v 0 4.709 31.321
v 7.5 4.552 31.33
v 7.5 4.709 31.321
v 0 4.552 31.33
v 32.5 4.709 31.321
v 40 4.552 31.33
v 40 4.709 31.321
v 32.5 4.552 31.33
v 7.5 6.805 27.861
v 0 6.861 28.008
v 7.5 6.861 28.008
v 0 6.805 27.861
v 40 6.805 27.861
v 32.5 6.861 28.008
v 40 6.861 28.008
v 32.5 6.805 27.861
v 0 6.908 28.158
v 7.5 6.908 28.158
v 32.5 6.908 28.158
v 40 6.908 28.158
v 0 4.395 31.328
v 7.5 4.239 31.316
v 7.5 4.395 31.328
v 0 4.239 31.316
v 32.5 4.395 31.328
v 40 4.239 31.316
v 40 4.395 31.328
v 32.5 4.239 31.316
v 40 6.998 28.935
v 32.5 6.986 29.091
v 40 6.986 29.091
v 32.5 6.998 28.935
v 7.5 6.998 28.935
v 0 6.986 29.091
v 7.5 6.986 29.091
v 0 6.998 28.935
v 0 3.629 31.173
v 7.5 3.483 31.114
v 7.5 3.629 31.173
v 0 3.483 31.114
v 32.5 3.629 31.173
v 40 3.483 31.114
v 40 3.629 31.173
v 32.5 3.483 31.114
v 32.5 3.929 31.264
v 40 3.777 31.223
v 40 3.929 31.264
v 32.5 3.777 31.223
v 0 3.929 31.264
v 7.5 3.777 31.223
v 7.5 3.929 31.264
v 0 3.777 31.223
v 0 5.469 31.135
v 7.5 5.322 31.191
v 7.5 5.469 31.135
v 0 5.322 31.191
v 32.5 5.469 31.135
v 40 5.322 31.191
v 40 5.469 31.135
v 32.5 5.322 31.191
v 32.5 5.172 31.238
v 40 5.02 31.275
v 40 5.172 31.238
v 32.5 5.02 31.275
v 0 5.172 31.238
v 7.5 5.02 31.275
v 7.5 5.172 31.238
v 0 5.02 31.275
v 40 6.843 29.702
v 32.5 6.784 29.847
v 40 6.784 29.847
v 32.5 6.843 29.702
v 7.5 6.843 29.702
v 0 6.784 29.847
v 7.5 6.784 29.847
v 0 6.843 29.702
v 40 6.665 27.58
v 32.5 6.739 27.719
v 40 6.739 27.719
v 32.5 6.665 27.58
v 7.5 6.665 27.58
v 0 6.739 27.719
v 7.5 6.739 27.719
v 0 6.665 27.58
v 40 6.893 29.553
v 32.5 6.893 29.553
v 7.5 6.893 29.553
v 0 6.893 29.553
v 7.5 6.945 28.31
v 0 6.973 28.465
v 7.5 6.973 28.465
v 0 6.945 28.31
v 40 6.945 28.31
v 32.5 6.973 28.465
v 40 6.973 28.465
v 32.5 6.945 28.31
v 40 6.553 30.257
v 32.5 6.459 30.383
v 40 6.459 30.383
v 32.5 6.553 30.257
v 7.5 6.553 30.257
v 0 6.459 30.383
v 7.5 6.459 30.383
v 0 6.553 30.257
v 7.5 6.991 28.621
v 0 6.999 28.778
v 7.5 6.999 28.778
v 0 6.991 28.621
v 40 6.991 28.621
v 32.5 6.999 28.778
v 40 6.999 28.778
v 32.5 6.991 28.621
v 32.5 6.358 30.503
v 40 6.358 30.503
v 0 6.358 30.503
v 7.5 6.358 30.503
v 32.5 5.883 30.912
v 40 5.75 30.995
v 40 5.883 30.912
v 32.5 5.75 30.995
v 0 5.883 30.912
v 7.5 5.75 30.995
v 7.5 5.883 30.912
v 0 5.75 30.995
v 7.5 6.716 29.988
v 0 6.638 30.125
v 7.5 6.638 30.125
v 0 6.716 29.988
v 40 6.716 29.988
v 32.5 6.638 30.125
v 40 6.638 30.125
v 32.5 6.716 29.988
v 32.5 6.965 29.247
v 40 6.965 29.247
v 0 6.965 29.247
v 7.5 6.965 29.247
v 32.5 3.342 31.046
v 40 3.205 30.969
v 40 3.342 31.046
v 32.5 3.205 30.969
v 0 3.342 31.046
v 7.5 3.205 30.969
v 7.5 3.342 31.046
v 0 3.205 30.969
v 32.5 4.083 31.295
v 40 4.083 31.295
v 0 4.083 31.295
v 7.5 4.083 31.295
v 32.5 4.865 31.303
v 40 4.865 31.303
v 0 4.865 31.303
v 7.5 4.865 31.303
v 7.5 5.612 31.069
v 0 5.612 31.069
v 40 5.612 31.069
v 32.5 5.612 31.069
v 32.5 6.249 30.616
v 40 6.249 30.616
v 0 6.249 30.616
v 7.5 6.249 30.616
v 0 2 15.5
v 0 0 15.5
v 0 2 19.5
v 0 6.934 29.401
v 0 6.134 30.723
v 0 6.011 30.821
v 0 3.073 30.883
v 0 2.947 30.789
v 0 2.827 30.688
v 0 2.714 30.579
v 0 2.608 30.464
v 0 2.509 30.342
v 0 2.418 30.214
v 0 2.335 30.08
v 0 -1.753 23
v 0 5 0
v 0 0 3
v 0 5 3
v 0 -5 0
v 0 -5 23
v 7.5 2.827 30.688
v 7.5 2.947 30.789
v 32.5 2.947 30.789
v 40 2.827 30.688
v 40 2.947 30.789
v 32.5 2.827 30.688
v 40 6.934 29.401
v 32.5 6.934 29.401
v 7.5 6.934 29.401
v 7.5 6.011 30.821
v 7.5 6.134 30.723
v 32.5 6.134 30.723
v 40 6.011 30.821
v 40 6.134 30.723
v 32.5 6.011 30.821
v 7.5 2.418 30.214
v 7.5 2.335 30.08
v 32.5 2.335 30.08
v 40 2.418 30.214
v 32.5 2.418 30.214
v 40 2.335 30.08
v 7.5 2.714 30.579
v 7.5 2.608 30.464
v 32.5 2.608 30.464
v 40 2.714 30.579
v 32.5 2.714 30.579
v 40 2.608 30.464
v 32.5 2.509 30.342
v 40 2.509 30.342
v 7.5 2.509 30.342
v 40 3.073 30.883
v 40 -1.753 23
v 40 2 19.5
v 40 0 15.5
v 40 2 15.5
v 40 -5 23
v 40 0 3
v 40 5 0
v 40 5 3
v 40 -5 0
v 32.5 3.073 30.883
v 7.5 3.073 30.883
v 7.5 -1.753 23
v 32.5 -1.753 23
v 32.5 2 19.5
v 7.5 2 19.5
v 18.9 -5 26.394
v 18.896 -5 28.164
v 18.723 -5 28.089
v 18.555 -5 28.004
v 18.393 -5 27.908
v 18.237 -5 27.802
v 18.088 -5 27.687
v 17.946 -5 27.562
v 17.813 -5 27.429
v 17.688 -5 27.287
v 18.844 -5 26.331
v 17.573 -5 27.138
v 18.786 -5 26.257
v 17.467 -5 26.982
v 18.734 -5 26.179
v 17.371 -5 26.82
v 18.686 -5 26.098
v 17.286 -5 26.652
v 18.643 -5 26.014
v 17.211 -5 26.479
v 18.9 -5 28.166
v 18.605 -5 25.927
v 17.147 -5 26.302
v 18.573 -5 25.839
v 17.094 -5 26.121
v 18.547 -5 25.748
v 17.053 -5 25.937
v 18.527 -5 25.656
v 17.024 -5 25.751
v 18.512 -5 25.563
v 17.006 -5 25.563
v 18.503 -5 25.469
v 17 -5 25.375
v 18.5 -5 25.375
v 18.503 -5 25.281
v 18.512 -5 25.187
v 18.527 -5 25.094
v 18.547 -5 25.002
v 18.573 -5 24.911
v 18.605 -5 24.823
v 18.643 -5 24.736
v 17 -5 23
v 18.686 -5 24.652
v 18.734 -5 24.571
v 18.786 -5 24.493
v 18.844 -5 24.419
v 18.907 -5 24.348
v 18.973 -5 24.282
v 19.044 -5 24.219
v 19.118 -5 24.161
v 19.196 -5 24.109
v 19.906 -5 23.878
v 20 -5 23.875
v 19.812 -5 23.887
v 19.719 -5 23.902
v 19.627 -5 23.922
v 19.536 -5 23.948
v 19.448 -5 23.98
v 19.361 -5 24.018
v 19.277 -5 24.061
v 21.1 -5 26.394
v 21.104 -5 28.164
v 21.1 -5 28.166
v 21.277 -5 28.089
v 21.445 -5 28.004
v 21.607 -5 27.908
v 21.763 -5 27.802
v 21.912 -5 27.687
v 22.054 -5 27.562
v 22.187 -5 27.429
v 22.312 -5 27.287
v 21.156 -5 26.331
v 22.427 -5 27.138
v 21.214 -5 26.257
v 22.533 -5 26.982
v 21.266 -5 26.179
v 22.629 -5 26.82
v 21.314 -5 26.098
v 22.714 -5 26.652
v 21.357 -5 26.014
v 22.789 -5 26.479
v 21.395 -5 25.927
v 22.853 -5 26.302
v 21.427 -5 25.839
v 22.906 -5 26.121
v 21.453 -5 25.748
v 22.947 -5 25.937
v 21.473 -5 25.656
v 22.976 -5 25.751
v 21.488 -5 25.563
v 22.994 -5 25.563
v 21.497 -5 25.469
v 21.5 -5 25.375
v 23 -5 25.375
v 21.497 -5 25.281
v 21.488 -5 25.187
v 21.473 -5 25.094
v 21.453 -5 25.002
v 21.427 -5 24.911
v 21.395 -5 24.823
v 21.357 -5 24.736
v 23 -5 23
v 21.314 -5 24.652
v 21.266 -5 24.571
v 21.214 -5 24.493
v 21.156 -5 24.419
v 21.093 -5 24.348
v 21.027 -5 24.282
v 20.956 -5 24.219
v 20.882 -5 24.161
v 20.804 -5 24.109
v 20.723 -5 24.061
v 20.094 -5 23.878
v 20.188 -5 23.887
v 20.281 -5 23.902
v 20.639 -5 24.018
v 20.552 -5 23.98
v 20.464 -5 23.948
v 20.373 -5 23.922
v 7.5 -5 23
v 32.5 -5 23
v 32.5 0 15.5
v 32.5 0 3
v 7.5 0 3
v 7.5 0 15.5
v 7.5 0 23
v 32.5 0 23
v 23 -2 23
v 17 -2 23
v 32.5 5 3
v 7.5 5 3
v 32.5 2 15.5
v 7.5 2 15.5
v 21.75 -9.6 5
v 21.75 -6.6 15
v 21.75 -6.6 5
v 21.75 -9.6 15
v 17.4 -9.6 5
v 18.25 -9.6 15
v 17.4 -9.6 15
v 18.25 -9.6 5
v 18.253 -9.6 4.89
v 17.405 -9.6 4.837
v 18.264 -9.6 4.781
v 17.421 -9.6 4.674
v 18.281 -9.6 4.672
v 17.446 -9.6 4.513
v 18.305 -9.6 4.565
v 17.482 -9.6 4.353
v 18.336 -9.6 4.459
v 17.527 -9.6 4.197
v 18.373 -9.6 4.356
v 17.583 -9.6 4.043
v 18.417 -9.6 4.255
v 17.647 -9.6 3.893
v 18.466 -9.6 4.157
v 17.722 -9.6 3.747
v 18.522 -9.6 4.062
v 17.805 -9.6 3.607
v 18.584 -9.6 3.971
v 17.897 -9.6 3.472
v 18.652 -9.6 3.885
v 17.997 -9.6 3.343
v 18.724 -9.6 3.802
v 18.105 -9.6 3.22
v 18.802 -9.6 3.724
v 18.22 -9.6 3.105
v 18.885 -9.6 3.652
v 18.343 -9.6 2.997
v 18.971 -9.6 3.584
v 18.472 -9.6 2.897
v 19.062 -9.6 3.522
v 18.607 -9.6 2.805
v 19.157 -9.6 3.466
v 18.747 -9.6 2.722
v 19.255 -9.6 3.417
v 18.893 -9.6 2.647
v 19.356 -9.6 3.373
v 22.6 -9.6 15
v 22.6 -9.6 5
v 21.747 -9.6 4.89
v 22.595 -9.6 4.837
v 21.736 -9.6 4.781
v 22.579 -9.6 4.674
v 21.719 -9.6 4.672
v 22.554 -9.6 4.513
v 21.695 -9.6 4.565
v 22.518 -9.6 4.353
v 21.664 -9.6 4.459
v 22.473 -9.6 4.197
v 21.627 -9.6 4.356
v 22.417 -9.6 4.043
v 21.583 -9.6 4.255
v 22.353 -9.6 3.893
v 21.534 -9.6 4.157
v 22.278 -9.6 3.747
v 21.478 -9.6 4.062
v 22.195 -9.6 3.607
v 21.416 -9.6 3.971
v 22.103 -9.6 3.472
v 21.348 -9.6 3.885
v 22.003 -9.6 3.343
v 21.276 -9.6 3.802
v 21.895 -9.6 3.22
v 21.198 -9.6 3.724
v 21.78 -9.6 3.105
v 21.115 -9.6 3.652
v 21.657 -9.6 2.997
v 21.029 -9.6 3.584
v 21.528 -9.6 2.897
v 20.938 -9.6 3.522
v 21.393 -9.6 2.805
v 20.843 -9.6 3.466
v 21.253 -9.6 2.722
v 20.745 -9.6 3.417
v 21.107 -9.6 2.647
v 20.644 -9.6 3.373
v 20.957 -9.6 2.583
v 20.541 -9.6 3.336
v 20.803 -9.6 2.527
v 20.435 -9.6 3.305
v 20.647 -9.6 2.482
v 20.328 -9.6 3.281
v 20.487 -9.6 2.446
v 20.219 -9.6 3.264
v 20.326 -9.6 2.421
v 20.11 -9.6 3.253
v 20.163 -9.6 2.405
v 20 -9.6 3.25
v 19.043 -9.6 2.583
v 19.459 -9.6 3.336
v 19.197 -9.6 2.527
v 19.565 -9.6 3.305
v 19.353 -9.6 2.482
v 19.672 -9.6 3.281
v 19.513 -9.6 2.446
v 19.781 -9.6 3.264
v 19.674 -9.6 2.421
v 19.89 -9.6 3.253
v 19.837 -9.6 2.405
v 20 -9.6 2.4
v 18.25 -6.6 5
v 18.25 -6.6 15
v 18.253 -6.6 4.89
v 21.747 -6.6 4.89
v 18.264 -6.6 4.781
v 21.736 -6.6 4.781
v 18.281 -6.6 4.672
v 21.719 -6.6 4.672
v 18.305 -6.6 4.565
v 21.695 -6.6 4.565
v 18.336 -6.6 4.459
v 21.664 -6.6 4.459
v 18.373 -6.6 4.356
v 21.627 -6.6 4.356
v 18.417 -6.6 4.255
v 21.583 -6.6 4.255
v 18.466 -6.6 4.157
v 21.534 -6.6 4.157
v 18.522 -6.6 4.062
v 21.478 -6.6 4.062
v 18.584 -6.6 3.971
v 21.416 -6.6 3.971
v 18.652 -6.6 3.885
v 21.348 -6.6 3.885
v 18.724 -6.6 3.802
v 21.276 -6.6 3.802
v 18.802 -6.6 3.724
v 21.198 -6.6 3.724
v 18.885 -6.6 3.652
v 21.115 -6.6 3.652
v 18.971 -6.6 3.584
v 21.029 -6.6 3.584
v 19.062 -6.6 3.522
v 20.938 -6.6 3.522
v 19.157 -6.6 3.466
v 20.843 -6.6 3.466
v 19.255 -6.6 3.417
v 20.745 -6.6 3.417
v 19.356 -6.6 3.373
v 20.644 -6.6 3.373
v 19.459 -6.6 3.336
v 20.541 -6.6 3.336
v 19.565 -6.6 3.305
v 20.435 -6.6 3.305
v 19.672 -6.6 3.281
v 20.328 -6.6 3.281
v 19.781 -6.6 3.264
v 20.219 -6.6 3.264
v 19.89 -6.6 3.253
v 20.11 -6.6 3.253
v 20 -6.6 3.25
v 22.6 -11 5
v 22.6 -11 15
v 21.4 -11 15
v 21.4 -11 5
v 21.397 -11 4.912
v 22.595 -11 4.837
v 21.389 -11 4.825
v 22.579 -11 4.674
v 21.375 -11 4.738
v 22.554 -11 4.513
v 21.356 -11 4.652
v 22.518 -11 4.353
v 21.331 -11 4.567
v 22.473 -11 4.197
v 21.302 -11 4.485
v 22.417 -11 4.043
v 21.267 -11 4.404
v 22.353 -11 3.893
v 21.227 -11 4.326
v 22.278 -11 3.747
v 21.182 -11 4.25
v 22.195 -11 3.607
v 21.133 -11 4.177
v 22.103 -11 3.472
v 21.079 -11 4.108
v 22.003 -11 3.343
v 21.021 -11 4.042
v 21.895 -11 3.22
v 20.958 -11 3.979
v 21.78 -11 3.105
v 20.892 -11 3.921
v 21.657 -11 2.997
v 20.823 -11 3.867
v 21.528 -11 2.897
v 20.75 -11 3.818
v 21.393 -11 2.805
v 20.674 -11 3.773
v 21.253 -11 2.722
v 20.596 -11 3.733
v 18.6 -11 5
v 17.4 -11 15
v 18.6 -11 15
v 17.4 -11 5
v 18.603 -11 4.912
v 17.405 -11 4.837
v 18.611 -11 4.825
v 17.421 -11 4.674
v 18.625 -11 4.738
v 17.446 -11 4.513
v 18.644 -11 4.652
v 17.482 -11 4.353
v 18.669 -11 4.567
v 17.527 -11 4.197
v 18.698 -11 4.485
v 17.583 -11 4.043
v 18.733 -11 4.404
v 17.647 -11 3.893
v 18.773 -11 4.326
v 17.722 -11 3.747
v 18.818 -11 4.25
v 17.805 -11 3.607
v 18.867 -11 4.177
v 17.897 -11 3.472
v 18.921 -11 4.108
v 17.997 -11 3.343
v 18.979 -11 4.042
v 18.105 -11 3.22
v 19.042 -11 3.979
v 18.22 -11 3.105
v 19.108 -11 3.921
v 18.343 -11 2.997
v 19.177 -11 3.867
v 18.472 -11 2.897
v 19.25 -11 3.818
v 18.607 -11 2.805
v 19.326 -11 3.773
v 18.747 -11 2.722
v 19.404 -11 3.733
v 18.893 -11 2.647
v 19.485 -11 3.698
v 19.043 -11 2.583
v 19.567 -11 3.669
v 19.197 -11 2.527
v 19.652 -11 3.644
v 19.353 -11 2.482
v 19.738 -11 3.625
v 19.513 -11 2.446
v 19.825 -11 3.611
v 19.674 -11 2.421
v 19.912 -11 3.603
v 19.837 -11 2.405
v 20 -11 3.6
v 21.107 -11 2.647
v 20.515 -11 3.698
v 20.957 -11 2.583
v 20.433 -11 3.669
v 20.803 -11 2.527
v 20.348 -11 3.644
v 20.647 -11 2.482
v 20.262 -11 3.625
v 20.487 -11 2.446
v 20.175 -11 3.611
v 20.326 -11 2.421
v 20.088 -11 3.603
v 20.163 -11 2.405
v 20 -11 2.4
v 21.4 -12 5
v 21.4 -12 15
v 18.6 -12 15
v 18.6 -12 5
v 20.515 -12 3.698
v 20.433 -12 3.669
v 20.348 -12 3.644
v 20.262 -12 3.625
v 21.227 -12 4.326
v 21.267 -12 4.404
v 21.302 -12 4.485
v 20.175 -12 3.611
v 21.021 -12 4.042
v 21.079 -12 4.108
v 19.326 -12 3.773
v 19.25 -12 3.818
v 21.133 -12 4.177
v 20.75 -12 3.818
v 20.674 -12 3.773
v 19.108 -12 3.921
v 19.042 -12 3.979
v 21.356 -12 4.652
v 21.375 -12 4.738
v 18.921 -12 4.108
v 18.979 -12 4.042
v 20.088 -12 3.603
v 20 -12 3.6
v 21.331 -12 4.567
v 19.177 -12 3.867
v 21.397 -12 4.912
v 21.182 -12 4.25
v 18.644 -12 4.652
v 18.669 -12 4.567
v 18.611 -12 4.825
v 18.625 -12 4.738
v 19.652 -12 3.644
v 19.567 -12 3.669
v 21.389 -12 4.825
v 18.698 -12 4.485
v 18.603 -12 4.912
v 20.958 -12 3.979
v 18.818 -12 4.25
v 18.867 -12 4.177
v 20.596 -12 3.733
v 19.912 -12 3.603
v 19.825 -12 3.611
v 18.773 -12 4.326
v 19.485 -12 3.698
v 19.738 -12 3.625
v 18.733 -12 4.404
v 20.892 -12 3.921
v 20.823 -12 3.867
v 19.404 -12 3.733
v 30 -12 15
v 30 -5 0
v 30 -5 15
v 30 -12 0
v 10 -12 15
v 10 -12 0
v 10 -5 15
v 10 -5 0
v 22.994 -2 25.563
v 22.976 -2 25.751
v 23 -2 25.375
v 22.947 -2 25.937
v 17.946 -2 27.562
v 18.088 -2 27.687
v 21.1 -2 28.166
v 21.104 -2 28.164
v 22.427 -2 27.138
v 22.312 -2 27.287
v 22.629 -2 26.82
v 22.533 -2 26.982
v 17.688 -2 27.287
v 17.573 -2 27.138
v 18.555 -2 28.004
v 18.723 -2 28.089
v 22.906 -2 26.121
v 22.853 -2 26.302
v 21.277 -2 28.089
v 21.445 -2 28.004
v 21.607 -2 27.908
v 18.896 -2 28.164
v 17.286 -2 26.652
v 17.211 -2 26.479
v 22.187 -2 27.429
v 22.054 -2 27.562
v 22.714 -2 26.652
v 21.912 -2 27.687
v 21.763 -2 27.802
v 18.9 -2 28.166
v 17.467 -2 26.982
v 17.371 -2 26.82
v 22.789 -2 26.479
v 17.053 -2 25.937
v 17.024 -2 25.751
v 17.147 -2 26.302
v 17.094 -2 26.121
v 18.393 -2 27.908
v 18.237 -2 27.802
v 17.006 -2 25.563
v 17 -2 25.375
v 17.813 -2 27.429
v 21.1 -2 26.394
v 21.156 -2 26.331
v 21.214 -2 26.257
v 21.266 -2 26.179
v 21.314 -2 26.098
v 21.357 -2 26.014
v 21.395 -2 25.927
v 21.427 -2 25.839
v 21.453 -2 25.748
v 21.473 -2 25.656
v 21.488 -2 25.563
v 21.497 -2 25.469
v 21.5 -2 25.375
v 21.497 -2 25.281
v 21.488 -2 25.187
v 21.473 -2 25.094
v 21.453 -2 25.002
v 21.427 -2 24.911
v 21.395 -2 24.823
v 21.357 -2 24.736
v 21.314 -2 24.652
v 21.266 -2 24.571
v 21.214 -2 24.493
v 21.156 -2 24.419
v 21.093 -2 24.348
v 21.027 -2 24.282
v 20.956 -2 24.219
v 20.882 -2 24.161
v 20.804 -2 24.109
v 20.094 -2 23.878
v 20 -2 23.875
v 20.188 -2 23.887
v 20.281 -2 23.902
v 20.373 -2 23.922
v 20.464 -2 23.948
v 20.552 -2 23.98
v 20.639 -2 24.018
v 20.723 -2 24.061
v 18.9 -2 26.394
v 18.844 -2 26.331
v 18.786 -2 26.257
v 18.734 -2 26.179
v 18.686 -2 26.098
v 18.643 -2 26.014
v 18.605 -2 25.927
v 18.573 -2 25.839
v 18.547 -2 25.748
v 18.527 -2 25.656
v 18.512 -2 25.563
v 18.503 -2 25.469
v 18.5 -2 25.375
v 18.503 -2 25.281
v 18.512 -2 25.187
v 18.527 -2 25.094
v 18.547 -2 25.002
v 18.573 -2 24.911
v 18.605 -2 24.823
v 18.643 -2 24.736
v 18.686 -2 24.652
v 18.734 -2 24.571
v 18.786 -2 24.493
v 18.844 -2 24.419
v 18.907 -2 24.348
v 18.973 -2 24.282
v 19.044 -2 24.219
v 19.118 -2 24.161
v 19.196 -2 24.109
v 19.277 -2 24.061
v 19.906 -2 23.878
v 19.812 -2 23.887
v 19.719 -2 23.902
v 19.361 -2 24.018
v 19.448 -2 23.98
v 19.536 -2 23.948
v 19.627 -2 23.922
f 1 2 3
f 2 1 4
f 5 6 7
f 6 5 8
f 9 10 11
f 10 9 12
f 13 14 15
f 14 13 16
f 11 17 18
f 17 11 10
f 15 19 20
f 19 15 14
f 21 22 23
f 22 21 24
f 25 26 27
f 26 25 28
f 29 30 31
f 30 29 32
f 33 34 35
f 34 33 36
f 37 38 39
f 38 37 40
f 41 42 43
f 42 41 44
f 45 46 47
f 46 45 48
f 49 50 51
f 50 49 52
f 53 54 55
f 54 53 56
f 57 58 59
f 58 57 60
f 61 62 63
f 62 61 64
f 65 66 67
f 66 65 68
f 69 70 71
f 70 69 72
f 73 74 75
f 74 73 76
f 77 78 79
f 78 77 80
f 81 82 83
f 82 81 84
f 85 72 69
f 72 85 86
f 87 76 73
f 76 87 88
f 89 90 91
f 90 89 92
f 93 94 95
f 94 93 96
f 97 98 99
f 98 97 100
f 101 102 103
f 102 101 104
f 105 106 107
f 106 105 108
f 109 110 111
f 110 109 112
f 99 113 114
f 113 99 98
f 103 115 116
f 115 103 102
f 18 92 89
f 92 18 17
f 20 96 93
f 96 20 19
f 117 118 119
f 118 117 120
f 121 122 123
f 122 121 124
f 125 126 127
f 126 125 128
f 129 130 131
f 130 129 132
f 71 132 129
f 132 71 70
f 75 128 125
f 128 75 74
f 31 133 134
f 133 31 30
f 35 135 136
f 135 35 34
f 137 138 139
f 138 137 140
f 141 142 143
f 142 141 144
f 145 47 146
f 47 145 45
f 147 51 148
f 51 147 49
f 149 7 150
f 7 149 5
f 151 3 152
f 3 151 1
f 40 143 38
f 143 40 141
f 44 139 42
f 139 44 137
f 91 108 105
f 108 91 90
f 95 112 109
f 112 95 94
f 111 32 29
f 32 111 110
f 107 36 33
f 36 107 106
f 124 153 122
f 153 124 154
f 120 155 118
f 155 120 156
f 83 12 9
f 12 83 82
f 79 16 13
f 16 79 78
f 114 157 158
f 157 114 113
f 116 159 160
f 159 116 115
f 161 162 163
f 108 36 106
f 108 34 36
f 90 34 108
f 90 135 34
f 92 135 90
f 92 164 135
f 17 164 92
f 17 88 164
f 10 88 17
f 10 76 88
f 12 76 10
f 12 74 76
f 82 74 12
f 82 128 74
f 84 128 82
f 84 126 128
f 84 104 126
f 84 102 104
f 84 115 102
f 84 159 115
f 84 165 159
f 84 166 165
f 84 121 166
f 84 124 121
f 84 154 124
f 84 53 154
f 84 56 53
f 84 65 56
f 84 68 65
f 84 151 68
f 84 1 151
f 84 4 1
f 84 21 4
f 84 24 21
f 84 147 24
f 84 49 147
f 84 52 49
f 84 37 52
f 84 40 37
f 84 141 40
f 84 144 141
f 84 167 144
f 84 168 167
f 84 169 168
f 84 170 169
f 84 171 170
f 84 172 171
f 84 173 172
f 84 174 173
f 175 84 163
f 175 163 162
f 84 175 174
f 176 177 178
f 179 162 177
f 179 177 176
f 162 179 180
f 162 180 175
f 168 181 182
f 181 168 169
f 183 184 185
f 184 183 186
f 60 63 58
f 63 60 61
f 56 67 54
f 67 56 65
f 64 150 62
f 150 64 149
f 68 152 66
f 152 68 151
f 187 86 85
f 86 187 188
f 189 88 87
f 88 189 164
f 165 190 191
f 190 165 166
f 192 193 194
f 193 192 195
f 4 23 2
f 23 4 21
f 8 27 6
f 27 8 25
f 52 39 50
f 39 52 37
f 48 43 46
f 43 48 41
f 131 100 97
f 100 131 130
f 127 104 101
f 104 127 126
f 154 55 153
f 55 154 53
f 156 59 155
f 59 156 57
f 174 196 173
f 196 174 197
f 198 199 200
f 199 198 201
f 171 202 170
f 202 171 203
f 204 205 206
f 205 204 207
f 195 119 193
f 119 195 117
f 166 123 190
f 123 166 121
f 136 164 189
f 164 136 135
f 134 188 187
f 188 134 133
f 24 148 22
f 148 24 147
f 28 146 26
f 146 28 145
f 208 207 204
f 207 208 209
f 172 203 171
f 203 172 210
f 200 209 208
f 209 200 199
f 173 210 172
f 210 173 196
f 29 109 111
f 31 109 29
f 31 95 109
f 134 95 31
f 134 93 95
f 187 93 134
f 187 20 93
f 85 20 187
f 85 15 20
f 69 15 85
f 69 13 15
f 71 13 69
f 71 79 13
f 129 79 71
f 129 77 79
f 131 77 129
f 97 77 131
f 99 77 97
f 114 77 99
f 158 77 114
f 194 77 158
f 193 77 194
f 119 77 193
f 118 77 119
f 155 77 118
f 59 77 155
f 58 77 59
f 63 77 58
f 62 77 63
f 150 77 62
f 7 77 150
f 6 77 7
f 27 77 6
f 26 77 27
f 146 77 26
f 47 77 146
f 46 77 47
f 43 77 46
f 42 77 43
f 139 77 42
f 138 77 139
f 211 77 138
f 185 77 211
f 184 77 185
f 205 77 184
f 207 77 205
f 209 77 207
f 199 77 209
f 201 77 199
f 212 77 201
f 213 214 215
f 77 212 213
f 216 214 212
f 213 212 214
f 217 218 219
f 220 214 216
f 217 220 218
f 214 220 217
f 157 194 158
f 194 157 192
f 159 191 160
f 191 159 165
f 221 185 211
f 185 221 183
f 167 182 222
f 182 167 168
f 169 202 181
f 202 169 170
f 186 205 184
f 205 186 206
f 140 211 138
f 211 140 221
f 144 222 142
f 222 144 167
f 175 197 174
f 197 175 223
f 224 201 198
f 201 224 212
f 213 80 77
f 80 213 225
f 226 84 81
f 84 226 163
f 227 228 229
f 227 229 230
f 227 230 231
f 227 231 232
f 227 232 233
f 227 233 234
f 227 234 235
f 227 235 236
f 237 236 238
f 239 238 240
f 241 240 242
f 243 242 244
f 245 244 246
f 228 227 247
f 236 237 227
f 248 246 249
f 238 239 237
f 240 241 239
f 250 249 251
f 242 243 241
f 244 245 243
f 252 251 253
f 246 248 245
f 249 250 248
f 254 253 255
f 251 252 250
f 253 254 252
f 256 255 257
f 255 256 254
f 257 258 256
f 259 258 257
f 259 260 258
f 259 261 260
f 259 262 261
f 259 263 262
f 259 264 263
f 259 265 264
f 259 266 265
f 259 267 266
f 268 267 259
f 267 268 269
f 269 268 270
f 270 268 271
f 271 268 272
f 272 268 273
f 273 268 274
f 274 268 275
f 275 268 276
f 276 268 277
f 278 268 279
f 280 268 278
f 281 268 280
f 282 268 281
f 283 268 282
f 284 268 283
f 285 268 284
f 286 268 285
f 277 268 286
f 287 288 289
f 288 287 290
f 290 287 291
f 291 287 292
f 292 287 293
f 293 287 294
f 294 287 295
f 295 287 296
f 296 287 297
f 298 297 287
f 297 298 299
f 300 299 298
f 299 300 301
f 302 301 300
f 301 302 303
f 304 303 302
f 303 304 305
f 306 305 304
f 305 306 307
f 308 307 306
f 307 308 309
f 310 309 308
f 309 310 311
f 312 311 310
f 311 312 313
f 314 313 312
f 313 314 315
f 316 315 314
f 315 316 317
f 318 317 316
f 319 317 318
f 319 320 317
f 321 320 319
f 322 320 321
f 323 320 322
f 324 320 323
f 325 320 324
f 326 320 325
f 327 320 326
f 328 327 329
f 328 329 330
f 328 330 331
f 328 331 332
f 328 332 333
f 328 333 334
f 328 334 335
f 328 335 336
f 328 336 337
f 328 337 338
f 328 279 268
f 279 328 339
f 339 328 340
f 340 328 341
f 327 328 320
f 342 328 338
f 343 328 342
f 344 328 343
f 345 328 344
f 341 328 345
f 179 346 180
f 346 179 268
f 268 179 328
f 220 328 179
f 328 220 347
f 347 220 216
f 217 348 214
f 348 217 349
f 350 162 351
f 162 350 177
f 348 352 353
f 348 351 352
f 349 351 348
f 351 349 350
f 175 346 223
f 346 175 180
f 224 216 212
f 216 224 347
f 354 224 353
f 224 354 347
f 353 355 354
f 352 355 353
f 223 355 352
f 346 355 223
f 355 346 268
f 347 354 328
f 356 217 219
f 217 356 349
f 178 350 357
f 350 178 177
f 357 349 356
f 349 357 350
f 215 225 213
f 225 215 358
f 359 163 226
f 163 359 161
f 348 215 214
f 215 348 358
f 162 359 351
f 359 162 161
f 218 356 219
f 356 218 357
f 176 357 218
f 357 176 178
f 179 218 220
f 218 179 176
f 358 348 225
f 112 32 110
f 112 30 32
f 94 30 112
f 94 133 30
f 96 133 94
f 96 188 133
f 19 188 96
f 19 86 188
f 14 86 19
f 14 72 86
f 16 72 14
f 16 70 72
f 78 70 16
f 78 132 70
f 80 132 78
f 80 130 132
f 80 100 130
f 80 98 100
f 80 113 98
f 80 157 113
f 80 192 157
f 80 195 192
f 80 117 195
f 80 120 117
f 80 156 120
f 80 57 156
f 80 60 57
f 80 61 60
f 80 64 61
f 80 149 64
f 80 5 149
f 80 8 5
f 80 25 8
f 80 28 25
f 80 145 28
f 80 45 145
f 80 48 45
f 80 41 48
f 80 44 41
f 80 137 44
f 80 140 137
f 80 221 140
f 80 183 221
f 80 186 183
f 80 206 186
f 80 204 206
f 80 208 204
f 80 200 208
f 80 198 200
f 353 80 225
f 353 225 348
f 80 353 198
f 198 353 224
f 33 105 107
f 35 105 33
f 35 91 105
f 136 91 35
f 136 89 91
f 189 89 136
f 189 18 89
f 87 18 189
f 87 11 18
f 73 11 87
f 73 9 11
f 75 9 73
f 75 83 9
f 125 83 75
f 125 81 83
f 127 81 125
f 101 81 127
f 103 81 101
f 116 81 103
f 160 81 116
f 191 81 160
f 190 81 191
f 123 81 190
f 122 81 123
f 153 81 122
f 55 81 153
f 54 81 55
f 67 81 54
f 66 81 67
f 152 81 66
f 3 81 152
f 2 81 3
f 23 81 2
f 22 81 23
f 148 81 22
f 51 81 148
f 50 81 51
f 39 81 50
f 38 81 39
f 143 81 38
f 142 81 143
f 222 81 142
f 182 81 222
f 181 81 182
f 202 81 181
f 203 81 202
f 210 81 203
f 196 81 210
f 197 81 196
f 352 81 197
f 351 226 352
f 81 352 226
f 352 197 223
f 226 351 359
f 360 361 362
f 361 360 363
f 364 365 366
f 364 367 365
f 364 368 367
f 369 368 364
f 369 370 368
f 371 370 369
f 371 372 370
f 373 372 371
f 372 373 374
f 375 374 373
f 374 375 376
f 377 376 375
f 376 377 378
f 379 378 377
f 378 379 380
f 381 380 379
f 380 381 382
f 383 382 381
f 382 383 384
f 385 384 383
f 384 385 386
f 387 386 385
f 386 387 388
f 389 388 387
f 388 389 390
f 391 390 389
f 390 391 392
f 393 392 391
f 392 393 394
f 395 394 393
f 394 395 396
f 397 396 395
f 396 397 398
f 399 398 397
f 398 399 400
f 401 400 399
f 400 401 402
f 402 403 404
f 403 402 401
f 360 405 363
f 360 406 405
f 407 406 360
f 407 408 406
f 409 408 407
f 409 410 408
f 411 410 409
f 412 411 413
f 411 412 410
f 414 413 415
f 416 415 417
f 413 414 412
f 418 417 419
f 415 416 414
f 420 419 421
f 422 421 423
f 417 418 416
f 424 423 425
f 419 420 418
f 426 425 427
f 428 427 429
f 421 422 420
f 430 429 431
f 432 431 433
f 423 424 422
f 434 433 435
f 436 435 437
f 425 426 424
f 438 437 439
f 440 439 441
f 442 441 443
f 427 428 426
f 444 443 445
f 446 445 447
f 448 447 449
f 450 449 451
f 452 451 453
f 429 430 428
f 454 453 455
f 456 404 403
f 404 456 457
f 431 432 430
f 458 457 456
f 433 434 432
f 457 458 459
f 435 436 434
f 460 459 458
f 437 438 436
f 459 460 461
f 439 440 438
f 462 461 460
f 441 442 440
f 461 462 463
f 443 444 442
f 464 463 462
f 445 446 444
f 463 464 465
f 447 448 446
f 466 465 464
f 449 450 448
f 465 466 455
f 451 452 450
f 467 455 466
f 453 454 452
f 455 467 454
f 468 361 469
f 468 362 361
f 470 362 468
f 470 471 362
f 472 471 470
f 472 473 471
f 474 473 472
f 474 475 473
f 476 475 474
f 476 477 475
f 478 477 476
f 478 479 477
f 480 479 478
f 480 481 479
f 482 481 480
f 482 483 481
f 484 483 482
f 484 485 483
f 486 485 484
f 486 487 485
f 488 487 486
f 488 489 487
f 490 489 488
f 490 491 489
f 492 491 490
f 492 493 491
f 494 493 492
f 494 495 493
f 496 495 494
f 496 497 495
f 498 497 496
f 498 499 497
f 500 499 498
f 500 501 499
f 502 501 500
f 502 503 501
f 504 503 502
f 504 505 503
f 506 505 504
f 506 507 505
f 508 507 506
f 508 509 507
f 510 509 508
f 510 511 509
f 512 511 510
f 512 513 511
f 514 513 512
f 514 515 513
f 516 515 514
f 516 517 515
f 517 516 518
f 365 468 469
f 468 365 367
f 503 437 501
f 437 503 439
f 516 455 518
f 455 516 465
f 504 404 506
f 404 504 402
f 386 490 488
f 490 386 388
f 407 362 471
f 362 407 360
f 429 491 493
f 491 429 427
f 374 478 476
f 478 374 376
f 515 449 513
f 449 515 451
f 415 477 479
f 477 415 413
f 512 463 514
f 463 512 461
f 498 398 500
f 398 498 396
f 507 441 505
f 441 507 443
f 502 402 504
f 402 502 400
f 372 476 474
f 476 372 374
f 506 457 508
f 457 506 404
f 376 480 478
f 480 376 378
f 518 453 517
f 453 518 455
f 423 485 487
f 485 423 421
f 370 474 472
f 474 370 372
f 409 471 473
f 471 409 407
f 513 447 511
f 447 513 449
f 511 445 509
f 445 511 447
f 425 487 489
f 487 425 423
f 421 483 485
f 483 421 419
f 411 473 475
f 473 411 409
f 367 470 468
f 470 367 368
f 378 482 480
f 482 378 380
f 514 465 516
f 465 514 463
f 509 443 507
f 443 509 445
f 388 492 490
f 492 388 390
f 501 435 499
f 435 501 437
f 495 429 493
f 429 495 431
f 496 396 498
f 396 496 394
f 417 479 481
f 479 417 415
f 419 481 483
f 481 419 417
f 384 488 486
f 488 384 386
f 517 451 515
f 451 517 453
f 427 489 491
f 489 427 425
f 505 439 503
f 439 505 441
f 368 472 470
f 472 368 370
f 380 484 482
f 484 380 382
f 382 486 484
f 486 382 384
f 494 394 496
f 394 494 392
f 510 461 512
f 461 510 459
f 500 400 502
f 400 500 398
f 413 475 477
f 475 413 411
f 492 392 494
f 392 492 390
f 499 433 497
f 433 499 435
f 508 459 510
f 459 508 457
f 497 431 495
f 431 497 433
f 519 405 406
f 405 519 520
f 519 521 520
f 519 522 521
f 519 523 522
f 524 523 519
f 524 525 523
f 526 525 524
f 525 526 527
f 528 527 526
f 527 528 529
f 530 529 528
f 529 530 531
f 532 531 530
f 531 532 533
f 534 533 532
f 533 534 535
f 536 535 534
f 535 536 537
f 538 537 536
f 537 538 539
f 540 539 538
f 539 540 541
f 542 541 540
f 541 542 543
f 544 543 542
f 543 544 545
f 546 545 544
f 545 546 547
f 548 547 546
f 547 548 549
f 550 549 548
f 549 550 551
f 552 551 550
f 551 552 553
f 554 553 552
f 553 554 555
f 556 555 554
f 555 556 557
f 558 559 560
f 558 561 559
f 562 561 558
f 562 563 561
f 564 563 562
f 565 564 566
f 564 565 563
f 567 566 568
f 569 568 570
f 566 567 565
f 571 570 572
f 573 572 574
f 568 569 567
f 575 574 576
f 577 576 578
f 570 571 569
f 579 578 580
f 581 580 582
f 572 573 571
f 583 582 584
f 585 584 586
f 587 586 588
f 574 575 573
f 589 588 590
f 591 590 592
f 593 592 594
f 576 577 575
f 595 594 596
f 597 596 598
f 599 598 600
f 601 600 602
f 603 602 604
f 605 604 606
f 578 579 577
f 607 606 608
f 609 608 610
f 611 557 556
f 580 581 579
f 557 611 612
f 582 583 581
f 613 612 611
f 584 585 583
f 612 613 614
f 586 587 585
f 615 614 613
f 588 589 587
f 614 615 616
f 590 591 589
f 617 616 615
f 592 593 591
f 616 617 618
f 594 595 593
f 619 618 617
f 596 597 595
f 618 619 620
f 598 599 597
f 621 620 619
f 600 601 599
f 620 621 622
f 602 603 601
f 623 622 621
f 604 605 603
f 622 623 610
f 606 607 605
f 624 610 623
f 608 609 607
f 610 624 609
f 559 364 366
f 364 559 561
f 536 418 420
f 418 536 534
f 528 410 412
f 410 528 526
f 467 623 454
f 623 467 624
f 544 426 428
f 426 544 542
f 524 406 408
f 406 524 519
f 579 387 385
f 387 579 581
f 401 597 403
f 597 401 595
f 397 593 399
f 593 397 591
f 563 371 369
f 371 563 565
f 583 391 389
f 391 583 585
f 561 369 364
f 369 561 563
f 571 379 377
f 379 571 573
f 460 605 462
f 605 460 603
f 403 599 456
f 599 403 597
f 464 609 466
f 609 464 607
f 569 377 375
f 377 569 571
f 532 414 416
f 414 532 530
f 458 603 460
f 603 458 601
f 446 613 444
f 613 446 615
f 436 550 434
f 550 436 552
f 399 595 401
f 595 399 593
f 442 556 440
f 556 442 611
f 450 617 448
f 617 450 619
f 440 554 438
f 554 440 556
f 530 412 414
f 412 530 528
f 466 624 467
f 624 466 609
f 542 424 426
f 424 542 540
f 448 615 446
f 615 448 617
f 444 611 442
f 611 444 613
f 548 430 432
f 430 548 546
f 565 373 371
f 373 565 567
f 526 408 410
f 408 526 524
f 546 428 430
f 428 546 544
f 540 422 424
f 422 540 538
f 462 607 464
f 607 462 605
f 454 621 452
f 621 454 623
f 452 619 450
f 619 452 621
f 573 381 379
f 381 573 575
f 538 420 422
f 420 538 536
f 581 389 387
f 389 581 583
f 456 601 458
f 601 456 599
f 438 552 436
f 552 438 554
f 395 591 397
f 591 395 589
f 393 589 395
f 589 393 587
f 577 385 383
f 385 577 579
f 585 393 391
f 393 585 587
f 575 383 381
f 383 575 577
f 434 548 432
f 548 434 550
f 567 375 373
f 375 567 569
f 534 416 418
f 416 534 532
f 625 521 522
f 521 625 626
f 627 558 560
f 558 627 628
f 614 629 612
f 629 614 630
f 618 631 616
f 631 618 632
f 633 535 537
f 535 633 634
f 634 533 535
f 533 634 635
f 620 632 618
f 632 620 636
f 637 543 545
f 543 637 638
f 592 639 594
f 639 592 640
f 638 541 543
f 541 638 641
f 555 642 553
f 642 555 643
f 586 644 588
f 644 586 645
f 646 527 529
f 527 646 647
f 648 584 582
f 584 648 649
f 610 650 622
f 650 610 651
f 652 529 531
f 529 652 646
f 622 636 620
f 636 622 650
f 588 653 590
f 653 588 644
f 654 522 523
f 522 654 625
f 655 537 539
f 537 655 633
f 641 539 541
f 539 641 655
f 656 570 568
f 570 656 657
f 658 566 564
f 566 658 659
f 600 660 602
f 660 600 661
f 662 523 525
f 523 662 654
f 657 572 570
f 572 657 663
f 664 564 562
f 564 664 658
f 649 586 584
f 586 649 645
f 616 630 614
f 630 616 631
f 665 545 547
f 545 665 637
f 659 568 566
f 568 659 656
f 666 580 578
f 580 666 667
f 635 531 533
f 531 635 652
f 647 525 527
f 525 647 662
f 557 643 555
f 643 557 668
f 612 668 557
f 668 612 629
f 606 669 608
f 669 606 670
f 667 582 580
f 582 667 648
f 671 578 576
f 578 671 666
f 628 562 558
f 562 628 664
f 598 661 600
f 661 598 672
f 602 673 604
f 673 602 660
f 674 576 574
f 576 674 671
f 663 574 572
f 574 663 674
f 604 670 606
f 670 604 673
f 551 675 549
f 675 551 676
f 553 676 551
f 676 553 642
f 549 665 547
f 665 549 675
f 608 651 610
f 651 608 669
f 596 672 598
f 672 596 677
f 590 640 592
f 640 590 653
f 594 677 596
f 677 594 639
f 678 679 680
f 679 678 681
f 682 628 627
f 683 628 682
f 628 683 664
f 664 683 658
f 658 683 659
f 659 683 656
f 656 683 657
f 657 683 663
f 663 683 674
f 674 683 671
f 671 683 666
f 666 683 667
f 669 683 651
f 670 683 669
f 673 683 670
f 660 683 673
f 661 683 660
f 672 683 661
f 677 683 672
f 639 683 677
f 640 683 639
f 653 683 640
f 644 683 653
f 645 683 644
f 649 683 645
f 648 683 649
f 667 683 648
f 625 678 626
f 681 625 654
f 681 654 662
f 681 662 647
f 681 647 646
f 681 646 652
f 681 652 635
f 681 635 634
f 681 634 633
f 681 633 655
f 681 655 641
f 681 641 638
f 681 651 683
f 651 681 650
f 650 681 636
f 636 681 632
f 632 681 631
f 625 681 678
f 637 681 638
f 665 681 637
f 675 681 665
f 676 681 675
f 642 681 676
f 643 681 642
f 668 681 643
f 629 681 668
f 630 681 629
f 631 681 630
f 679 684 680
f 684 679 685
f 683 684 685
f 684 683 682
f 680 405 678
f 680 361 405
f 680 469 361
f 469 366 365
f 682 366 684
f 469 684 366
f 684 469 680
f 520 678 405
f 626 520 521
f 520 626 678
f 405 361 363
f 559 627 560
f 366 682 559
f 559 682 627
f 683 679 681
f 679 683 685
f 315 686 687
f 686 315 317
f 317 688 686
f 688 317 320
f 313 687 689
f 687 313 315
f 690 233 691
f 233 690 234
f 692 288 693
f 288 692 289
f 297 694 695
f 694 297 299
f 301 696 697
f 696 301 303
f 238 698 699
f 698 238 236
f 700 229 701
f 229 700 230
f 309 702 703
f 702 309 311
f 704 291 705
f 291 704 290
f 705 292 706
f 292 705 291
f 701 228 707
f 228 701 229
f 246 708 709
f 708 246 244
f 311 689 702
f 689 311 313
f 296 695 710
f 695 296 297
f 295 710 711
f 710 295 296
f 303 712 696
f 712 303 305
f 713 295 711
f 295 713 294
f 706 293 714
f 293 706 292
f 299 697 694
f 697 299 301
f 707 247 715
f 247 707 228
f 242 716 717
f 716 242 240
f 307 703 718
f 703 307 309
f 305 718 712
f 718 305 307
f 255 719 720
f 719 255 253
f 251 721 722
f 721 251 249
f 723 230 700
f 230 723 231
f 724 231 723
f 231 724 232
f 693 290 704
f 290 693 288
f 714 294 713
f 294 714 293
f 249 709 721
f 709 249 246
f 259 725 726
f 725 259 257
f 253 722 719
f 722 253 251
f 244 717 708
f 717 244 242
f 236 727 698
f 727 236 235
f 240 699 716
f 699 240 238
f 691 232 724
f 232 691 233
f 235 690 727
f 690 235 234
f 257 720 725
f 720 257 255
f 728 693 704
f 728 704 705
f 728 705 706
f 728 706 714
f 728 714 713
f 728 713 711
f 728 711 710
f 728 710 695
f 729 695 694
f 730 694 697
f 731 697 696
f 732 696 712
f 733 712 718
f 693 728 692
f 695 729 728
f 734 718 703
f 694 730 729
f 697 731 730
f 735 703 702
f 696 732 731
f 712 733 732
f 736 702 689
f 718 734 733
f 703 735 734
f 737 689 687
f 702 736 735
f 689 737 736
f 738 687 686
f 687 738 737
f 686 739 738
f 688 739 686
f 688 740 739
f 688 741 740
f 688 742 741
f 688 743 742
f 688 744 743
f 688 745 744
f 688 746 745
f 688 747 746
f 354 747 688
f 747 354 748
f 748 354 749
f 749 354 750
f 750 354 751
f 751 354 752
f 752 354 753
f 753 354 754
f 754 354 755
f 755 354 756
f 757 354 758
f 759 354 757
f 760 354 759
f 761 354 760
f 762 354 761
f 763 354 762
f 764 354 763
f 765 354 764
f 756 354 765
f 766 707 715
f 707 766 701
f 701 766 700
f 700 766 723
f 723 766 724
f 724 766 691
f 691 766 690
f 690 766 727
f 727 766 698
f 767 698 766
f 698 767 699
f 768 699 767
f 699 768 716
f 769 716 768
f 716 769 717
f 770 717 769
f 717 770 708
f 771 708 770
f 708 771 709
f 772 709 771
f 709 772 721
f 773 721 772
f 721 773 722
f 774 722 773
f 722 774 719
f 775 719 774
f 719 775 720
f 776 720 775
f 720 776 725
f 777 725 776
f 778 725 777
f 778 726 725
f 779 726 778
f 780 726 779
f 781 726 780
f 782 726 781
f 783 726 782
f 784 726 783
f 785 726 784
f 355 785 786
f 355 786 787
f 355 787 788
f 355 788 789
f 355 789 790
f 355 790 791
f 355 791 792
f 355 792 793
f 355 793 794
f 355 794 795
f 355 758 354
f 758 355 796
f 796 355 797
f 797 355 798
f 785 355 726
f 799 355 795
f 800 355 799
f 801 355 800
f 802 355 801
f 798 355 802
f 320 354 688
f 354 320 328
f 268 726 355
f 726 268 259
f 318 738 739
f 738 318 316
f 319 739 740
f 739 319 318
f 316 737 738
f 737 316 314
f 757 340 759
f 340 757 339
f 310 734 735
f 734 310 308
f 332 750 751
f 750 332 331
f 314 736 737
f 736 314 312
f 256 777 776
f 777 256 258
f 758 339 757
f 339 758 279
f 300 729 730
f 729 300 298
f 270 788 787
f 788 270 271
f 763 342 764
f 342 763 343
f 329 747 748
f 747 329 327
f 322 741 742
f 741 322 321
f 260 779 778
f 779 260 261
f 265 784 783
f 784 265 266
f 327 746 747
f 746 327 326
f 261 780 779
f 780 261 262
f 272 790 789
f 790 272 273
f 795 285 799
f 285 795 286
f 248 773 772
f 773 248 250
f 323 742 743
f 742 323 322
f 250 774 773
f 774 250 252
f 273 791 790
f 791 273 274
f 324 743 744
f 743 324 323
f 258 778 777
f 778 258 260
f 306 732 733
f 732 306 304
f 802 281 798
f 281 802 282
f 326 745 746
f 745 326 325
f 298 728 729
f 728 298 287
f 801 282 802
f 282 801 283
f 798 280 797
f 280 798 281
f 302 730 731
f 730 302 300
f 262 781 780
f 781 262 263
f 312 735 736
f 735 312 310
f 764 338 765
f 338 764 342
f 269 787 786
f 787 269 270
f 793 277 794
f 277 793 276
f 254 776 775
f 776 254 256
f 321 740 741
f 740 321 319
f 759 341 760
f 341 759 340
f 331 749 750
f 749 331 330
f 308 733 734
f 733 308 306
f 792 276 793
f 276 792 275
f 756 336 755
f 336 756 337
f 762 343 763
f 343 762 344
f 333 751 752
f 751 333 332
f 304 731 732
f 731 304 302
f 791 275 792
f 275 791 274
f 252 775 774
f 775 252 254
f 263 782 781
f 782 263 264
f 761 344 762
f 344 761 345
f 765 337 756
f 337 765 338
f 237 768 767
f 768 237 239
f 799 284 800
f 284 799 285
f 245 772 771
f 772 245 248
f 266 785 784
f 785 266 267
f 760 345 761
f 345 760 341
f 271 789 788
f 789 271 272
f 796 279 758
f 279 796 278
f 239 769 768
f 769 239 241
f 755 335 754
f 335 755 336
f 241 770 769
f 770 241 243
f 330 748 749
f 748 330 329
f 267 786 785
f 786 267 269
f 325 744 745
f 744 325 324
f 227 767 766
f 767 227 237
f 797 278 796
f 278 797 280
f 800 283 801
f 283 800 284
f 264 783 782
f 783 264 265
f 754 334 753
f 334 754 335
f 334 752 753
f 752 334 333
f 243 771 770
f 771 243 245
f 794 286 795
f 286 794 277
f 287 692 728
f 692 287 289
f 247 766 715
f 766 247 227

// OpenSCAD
length = 11;
gap1   = 1;   // 1
gap2   = 1.4; // 1.2
gap3   = 3;   // 3
gap_all = gap1 + gap2 + gap3;
width1 = 2.8;   // 2.7   -> 2.8
width2 = 5.2;  // 4.75  -> 4.4; 5 -> still less
width3 = 3.5;  // 3.25  -> 3.03
holder_height = 7;

// layer of slot of fixed width and round end on one side
module layer(width, height, length, shift=0) {
    union() {
        translate([-width/2,0,shift])
            cube([width,length,height]);
        translate([0,0,shift])
            cylinder(height, width/2, width/2, $fn=100);
    }
}

// slot shape to insert remaining TrackIR pin
module grove() {
    union() {                                       //     real   expect   diff   ratio
        layer(width3, gap3, length, 0);             // w = 3.03   3.25     -0.22
        layer(width2, gap2, length, gap3);          // w = 4.4    4.75     -0.35
        layer(width1, gap1+0.1, length, gap3+gap2); // w = 2.8    2.7      +0.1
    }
}

// square piece where TrackIR stays
module holder() {
    offset = holder_height-gap_all;
    translate([0, 5, offset]) difference() {
        translate([-10, -5, -offset]) cube([20, 15, holder_height]);
        grove();
    }
}


base_wall = 3;
base_width_ir = 40;
base_width_cam = 30;
base_width = base_width_ir; // + base_width_cam;
base_gap = 44.5;
base_height = 5;
base_hook_height = 5; // was 7

// part of holder that sits on monitor
module basement2() {
    union() {
        cube([base_width, base_gap+1.4, base_height]);
        translate([0, -base_wall, -base_hook_height]) cube([base_width, base_wall, base_height + base_hook_height]);
        translate([0, base_gap]) rotate([20, 0, 0]) translate([0, 0, -base_hook_height-0.9]) cube([base_width, base_wall, base_height + base_hook_height]);
    }
}

wire_dia = 3;
wire_thick = 1.5;
wire_thick2 = 3;
wire_gap_width = 2.2;

module wire_hole() {
    difference() {
        union() {
            cylinder(h=wire_thick2, r=wire_dia/2+wire_thick, center=true, $fn=100);
            translate([0,-(wire_dia/2+wire_thick)/2,0]) cube([wire_dia+wire_thick*2, wire_dia/2+wire_thick, wire_thick2], center=true);
        }
        cylinder(h=wire_thick2+1, r=wire_dia/2, center=true, $fn=100);
        translate([0,wire_dia+wire_thick,0]) cube([wire_gap_width, (wire_dia+wire_thick) * 2, wire_thick2+1], center=true);
    }
}

module tail(thick, width, len, angle, base_thick) {
    vert_len = thick/cos(angle);
    center_shift = -(base_thick-vert_len)/2 * tan(90-angle);
    translate([0, center_shift, base_thick/2]) rotate([-angle, 0, 0]) difference() {
        // translate([width/2, 0, 0]) 
        union() {
            // round end
            color([1,0.2,0.2]) translate([0, len, 0]) rotate([0, 90, 0]) cylinder(h=width, r=thick/2, center=true, $fn = 100);
            // main plane
            color([1,0.3,0.3]) translate([0, len/2 - thick/4, 0]) cube([width, len + thick/2, thick], center=true);
            // joining bit
            color([1,0.4,0.4]) rotate([angle, 0, 0]) cube([width, base_thick, base_thick], center=true);
        }
        // base plane trim above
        color ([0, 1, 0]) translate([0, 0, thick]) cube([width+2, len * 2, thick], center=true);
        // join trim
        color ([0, 0, 1]) rotate([angle, 0, 0]) translate([0, 0, base_thick]) cube([width+2, base_thick, base_thick], center=true);
        color ([0, 0, 1]) rotate([angle + 90, 0, 0]) translate([0, 0, base_thick]) cube([width+2, base_thick, base_thick], center=true);

    }
}

base_depth = 20;
back_radius = 100;
back_thickness = 5;
base_gap_width = 25;

module basement() {
    difference() {
        union() {
            // flat part
            cube([base_width, base_depth, base_height]);
            translate([0,12.5,-2]) cube([base_width, 4, base_height + 2]);
            // front side
            translate([0, -base_wall, -base_hook_height]) cube([base_width, base_wall, base_height + base_hook_height]);
            // back curve (shift -21, +10) -> (-18, 3)
            // difference() {
            //     translate([base_width/2, -back_radius/2-9.5, -back_radius/2-9]) rotate([0,90,0]) difference() {
            //         cylinder(h=base_width, r=back_radius, center=true, $fn=500);
            //         cylinder(h=base_width+2, r=back_radius - back_thickness, center=true, $fn=500);
            //     }
            //     translate([-1, -back_radius*3, 2]) cube([base_width+2, back_radius*6, 100]);
            //     translate([-1, -back_radius*3, -back_radius*3-7]) cube([base_width+2, back_radius*6, back_radius*3]);
            //     translate([-1, -back_radius*2, -back_radius]) cube([base_width+2, back_radius*2, back_radius*2]);
            // }
            
            translate([base_width/2, 12.5 + 4, -2]) tail(base_height, base_width, 10, 30, base_height);
        }
        translate([(base_width-base_gap_width)/2, 0, -back_radius]) cube([base_gap_width, back_radius, back_radius]);
        translate([(base_width-base_gap_width)/2, base_depth, 0]) cube([base_gap_width, back_radius, back_radius]);
    }
}

module basement2() {
    union() {
        // flat part
        cube([base_width, base_gap+1.4, base_height]);
        // front side
        translate([0, -base_wall, -base_hook_height]) cube([base_width, base_wall, base_height + base_hook_height]);
        // back side
        translate([0, base_gap]) rotate([20, 0, 0]) translate([0, 0, -base_hook_height-0.9]) cube([base_width, base_wall, base_height + base_hook_height]);
    }
}

cam_holder_offset = 35;
cam_holder_height = 27;
cam_holder_width = 22;
cam_holder_thinkness = 5;

module main() {
    rotate([90, 0, 0]) union() {
        translate([0, base_wall, 0]) 
            basement();
        translate([base_width_ir/2, 0, base_height]) 
            holder();
        // translate([base_width_ir + (base_width_cam - cam_holder_width)/2, cam_holder_offset - cam_holder_thinkness - base_wall, base_height]) 
        //     cube([cam_holder_width, cam_holder_thinkness, cam_holder_height]);
        translate([base_width_ir/2, base_depth + base_wall + (wire_thick/2 + wire_dia)/2 + 0.5, base_height-wire_thick2/2]) wire_hole();
    }
}

main();

// tail-height, width, length, angle, base-plate-height
// tail(base_height, base_width, 10, 65, base_height+2);
